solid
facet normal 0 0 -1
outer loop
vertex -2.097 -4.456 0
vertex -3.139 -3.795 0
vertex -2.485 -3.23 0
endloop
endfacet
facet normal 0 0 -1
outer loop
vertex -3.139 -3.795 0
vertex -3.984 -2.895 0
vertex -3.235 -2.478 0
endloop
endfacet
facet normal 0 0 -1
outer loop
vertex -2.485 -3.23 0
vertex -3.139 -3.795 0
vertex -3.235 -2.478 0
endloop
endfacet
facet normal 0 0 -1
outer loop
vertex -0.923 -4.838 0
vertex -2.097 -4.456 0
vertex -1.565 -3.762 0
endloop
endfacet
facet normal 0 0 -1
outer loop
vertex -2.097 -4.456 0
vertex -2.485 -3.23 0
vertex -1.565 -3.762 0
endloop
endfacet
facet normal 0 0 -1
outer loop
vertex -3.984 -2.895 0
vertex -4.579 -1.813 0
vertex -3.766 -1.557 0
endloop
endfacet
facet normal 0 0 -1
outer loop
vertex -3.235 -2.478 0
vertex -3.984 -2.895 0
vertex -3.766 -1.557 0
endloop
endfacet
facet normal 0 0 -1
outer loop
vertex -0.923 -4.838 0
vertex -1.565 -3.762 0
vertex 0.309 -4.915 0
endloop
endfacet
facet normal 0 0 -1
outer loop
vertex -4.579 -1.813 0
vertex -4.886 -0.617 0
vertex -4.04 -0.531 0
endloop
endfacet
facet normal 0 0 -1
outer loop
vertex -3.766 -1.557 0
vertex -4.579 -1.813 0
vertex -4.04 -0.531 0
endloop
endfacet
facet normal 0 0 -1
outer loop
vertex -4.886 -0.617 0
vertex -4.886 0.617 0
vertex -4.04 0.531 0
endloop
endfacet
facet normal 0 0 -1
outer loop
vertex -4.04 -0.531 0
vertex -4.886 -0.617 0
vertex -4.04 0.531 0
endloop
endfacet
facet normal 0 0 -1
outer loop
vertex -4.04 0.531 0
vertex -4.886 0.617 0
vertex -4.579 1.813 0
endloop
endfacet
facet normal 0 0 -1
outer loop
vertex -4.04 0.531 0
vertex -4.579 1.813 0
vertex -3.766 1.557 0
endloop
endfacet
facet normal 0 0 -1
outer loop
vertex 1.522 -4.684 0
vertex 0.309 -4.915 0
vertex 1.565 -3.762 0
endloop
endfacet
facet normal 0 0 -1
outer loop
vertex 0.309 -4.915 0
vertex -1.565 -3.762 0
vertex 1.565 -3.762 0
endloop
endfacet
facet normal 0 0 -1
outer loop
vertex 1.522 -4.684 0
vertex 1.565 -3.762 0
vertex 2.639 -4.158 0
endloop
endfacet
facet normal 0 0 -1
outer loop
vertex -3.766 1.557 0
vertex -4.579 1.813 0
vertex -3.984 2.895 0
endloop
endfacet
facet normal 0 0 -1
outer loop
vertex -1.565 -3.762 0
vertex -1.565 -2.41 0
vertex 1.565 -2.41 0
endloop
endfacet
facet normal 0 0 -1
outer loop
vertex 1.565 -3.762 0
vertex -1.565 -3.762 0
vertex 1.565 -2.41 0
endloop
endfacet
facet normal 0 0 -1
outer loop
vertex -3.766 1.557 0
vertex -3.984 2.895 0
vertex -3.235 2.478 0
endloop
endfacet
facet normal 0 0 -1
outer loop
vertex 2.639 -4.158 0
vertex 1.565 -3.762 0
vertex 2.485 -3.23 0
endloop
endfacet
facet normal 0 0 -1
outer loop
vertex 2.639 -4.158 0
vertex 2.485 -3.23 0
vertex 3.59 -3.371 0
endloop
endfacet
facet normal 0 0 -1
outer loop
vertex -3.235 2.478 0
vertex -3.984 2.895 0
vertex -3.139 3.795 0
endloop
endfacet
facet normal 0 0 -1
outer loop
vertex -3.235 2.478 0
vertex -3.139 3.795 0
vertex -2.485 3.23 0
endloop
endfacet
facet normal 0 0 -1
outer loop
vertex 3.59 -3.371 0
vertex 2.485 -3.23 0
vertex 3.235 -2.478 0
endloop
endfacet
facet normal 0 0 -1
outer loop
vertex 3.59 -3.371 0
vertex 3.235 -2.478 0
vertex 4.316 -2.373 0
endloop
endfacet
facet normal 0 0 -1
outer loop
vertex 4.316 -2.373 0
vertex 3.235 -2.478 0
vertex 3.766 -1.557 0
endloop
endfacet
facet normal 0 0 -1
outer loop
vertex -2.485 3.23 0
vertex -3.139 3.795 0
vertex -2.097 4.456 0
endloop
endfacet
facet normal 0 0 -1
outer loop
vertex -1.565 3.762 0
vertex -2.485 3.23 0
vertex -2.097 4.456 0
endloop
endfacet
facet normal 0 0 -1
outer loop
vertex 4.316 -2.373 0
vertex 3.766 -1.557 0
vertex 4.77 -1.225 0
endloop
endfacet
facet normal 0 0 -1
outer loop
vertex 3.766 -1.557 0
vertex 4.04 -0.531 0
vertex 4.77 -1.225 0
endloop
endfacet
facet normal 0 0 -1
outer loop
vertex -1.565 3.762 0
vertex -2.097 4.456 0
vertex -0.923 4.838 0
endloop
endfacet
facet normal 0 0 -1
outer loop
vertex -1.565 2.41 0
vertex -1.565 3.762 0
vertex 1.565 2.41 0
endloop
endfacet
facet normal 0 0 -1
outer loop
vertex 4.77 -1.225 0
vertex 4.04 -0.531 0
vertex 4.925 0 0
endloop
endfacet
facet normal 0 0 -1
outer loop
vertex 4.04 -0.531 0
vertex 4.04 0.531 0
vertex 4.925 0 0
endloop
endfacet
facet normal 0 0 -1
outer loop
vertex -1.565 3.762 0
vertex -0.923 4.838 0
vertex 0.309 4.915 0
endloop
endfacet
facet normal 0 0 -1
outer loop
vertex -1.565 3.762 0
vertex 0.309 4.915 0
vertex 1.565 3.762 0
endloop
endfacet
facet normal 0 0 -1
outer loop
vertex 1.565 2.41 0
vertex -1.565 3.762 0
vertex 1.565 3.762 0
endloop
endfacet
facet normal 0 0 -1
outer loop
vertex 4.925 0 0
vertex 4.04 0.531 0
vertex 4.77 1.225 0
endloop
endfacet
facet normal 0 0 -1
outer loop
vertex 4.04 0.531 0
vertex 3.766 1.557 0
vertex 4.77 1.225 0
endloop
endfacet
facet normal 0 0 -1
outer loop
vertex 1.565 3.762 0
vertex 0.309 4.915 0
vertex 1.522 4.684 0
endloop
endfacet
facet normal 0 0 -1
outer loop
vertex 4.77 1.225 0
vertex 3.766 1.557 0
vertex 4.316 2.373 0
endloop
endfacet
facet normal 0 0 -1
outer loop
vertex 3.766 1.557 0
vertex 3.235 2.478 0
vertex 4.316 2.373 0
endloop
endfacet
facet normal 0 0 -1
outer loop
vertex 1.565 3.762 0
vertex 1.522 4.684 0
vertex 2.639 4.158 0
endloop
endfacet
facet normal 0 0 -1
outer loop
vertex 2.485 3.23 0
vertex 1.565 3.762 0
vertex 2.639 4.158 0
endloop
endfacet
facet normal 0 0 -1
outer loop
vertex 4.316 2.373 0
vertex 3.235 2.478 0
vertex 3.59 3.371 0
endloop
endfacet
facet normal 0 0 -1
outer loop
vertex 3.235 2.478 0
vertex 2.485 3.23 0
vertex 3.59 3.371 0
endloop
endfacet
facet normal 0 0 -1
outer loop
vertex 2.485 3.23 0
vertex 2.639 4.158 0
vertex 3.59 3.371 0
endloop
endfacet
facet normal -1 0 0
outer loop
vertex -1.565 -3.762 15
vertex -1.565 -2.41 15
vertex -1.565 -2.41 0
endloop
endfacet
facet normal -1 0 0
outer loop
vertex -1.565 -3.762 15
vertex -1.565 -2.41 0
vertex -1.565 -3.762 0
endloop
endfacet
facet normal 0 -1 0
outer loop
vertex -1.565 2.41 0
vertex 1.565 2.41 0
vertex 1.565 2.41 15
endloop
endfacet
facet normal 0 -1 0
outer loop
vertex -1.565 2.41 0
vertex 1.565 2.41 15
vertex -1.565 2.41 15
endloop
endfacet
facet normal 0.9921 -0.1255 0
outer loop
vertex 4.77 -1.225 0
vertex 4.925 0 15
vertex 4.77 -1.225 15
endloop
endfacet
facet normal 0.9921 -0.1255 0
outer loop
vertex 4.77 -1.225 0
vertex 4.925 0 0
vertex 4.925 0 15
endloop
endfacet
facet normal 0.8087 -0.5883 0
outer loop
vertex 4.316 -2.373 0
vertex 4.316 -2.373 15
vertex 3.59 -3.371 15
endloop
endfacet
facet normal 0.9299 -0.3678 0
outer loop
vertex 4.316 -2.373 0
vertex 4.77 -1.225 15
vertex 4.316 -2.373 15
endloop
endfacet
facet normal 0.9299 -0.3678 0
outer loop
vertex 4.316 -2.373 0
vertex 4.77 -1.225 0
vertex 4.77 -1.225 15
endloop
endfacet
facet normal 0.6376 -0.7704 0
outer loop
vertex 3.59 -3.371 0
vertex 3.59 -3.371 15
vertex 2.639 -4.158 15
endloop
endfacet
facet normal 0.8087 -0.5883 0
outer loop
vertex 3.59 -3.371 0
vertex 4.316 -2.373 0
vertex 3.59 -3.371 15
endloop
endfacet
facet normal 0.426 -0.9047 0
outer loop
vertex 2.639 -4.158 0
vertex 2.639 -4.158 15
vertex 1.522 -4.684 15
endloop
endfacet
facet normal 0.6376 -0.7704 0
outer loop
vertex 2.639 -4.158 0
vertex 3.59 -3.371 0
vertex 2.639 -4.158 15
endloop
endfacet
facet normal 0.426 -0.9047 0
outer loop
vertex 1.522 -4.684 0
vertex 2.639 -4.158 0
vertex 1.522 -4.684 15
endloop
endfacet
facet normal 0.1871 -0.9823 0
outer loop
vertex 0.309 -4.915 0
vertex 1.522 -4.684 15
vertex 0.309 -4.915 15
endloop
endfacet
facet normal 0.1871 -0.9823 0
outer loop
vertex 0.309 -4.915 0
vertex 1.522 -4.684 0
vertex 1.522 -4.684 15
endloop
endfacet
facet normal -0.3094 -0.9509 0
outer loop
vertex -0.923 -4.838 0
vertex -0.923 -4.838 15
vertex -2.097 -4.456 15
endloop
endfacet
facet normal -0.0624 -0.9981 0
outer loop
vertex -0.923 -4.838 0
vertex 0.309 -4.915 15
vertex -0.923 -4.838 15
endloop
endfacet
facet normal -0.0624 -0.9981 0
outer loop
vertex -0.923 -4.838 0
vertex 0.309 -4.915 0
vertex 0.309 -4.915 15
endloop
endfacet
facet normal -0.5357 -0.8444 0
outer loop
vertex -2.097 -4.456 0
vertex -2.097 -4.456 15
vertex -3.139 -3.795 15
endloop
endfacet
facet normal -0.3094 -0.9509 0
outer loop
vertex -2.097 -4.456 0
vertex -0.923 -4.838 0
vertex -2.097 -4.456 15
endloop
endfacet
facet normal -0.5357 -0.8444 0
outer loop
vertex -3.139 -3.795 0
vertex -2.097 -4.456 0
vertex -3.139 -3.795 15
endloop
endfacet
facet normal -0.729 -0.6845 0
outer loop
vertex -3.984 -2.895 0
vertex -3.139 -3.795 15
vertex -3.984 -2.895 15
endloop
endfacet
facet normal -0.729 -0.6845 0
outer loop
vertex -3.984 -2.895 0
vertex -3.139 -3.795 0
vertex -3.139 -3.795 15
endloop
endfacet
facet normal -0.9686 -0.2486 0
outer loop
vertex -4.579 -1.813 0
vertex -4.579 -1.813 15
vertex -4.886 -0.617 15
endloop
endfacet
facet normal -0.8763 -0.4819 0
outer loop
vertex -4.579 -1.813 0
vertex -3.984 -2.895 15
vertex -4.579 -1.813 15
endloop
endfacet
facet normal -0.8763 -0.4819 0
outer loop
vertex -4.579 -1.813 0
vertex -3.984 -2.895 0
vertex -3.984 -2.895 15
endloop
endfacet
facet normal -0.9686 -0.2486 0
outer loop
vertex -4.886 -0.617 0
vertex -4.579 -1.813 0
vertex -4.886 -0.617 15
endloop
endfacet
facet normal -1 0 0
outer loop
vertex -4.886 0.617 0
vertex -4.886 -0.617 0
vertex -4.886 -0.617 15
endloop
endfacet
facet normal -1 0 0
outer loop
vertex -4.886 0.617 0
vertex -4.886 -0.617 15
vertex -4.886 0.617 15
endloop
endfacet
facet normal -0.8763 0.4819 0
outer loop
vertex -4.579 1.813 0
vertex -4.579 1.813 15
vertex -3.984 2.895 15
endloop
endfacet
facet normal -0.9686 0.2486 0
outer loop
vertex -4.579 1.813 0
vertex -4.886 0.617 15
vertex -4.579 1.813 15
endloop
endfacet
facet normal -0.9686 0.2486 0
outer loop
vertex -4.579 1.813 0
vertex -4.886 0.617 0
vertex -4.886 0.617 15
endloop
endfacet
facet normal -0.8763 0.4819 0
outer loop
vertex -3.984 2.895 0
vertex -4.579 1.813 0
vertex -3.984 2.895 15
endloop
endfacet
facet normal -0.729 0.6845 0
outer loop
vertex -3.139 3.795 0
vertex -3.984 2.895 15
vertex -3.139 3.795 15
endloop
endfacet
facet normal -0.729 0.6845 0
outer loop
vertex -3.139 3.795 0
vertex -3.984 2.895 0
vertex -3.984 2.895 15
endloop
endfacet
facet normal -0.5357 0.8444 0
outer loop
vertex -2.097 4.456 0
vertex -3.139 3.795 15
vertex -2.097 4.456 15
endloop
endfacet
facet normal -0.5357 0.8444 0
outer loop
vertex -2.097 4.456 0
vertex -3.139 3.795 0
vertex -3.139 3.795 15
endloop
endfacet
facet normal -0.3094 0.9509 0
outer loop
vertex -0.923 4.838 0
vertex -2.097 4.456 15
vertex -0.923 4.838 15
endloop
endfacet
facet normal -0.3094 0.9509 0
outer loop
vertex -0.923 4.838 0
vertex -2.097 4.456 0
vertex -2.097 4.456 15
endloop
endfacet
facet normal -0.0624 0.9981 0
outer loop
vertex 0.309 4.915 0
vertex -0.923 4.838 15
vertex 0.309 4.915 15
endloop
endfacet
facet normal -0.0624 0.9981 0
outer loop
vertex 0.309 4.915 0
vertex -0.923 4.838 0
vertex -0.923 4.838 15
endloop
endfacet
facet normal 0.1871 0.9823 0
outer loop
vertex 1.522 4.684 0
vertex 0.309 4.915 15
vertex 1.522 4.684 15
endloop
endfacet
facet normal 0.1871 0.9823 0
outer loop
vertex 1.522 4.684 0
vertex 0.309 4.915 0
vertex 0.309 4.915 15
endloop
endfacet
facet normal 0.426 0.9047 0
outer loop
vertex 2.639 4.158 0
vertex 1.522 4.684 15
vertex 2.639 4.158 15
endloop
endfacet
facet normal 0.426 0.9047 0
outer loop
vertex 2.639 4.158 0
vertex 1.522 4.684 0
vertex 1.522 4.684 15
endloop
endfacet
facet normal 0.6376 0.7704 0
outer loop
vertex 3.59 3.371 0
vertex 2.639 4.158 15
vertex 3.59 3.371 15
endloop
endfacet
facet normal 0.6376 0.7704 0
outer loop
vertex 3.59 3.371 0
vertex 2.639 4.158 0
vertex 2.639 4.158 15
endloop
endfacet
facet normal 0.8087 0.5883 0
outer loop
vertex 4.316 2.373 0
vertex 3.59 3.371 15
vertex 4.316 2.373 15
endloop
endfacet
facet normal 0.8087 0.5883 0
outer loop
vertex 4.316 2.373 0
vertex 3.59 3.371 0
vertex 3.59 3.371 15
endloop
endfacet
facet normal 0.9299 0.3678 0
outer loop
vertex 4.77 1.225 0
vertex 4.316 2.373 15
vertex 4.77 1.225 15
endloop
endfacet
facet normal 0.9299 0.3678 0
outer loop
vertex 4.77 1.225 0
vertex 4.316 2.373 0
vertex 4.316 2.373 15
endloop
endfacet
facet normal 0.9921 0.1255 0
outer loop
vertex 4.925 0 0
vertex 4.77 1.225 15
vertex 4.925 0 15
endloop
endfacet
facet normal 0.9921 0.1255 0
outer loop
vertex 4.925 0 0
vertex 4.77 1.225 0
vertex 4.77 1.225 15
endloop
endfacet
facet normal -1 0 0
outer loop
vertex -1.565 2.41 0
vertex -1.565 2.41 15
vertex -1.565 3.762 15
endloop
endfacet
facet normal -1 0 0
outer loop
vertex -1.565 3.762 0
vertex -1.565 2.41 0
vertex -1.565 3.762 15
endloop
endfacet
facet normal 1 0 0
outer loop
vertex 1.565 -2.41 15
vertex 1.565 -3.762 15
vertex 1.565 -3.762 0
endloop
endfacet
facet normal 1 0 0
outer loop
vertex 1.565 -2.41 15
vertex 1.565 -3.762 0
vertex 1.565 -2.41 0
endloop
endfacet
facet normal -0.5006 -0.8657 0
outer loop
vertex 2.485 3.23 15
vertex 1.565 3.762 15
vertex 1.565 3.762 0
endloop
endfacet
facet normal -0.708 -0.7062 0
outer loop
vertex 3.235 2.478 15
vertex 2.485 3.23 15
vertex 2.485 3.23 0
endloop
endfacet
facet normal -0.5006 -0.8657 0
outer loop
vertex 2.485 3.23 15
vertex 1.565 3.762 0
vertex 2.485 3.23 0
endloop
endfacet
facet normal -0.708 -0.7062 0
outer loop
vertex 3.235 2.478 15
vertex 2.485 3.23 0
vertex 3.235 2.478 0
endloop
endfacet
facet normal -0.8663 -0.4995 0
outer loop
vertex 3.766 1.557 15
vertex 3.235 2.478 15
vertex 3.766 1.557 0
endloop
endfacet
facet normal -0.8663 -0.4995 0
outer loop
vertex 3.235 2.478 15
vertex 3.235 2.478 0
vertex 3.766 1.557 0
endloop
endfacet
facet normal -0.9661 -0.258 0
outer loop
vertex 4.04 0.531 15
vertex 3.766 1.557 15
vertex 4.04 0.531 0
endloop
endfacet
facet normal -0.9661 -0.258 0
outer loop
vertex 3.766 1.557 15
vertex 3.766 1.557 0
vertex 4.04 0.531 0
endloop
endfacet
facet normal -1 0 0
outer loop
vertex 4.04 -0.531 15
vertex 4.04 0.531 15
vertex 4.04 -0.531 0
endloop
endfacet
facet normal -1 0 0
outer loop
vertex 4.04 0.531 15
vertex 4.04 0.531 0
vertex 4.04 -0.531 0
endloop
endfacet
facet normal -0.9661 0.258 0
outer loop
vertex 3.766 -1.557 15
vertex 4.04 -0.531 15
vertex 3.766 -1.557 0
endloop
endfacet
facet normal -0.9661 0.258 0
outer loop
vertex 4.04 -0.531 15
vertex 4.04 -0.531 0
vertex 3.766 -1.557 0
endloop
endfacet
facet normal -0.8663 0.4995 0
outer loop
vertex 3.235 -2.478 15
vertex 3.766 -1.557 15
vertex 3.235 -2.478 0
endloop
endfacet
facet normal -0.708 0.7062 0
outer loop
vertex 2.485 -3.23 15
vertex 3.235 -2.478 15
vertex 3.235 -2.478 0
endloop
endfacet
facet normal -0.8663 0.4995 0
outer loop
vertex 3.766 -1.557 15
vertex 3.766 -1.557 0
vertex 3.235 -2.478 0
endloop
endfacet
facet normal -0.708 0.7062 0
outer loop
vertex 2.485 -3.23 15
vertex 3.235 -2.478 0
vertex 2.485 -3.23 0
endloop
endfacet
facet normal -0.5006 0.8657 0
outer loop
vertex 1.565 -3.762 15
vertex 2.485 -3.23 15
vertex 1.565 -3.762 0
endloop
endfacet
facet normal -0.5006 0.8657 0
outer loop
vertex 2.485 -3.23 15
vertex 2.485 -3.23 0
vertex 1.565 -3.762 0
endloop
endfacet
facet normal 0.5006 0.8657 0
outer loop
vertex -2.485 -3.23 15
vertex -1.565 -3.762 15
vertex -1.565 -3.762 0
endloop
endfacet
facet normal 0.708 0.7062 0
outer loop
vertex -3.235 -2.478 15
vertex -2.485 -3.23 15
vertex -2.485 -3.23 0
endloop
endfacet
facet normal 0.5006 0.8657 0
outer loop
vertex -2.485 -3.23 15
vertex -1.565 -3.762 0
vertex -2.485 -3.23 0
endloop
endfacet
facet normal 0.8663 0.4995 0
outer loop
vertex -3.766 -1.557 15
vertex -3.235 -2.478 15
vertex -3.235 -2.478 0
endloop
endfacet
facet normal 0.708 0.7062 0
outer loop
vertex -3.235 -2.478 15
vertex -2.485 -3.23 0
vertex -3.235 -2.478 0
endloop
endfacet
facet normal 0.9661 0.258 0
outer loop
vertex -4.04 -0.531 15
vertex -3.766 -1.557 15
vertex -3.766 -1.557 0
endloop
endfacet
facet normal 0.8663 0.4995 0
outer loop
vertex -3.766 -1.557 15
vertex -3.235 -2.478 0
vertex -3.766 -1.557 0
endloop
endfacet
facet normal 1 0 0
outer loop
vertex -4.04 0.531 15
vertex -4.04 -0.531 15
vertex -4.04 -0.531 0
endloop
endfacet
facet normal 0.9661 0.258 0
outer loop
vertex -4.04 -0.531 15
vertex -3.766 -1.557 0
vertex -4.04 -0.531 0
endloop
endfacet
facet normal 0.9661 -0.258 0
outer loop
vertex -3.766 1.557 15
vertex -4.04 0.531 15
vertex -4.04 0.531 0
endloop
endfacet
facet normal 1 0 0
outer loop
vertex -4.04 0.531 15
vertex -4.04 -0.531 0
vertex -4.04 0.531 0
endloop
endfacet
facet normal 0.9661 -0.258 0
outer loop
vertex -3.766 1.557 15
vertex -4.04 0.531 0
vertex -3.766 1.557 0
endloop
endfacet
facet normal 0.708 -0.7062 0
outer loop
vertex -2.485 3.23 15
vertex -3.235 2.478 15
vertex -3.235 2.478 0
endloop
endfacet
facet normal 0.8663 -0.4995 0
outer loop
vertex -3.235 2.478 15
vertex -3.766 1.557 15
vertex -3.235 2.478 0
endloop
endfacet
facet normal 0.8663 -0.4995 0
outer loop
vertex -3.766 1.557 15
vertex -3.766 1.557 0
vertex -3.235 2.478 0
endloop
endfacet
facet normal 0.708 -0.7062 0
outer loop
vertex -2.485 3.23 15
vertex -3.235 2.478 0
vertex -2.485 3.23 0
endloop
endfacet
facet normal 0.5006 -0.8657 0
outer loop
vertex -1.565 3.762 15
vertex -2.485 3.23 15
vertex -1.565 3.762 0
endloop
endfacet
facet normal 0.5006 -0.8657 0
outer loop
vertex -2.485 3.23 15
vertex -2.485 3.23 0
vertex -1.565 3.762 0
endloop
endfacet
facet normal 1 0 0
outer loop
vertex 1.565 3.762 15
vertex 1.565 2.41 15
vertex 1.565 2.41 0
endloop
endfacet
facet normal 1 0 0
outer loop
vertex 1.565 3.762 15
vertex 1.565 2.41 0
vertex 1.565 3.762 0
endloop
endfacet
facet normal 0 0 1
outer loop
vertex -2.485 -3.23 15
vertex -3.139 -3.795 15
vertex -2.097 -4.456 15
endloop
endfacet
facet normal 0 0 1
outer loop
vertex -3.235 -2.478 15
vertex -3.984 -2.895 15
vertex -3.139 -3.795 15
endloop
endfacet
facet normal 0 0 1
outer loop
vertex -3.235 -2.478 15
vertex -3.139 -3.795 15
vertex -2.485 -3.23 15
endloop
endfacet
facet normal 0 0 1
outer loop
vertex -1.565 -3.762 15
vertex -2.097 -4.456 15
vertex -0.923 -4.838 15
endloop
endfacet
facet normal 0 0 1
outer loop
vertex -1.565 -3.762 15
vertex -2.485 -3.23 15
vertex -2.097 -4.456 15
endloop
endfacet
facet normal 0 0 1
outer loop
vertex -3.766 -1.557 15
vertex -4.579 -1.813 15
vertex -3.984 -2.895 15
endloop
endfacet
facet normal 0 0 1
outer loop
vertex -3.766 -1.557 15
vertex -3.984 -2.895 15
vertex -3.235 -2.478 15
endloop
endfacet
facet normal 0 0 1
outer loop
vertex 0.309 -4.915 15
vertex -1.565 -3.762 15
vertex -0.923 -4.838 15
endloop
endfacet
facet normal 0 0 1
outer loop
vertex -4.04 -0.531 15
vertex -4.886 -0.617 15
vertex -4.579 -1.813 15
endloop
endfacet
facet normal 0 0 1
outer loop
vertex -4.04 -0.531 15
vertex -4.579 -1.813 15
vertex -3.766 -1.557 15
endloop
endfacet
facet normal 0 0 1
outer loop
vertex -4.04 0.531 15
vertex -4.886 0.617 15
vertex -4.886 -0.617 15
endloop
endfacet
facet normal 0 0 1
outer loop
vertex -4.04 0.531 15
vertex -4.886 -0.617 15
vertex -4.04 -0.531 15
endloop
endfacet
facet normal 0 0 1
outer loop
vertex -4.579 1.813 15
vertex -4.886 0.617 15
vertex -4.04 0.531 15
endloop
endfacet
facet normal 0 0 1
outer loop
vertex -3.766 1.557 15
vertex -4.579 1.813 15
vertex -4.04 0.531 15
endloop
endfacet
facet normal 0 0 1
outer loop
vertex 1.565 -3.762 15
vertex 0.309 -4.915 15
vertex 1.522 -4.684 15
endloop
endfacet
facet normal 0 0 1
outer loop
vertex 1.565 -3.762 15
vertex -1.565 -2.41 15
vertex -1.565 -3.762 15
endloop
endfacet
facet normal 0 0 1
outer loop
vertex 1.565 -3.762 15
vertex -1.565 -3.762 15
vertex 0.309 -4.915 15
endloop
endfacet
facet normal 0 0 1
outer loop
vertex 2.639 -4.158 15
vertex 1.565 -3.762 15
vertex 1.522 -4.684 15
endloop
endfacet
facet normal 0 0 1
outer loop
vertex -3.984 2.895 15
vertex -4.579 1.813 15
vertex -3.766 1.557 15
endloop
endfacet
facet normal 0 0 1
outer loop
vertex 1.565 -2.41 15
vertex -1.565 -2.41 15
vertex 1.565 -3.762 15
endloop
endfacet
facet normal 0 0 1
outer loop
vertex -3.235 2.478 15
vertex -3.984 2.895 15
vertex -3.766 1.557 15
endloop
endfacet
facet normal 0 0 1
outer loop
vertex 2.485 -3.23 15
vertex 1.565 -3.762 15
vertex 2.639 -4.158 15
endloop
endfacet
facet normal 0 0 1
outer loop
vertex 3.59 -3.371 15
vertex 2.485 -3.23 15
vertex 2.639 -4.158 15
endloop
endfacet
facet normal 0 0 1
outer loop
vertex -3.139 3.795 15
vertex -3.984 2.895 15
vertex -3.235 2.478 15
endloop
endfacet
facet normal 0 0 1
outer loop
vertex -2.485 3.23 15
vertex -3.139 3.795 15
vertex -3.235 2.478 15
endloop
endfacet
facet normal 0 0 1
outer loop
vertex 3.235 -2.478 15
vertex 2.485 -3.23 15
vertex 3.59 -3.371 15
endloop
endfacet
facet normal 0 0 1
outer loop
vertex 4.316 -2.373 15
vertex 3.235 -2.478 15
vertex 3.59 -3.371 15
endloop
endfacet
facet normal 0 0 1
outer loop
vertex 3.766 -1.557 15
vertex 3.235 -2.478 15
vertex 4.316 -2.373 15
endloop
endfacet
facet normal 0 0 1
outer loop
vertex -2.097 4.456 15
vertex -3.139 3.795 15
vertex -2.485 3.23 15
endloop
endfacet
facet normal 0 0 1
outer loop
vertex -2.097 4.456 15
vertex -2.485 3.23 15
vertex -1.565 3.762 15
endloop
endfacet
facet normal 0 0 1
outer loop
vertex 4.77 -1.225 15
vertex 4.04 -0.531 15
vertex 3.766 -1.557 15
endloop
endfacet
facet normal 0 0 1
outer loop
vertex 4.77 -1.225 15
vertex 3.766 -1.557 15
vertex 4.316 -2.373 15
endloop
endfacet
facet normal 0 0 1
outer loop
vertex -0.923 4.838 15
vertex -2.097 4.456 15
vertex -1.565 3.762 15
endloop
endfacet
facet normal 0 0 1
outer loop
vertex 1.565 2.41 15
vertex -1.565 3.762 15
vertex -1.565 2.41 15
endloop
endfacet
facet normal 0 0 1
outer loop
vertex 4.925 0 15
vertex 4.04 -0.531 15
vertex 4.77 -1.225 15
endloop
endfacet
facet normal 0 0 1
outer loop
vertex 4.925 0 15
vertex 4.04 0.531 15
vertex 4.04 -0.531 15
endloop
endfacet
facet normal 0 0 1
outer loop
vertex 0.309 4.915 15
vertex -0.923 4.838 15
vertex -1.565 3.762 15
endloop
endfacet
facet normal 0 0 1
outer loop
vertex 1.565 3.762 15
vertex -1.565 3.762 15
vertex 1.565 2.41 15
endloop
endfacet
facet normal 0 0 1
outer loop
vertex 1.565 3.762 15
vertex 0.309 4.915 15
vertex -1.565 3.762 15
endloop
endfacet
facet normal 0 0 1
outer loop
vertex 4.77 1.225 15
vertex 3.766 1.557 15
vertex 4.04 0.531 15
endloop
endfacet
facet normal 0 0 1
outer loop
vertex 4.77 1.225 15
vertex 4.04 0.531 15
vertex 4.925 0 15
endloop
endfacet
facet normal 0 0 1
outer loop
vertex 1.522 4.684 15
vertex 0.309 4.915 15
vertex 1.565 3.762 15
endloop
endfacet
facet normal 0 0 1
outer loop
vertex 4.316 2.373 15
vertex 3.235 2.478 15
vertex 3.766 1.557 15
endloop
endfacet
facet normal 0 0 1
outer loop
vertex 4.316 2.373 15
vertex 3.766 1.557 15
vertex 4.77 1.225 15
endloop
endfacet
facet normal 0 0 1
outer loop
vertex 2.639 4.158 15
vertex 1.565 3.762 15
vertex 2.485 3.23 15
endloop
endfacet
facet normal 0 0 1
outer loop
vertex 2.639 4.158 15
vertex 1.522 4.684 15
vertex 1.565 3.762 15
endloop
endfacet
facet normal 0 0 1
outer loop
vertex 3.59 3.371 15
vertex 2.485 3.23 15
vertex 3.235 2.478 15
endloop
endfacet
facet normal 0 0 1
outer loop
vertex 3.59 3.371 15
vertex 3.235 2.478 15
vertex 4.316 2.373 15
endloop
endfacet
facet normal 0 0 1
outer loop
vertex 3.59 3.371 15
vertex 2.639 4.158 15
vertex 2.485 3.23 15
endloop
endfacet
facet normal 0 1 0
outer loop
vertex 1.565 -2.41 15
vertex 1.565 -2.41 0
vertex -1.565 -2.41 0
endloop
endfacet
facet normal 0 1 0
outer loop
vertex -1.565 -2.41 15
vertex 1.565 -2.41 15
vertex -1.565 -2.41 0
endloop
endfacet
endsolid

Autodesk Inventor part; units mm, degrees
ref_plane "YZ Plane" through (0, 0, 0) normal (1, 0, 0) x (0, 1, 0)
ref_plane "XZ Plane" through (0, 0, 0) normal (0, 1, 0) x (-1, 0, 0)
ref_plane "XY Plane" through (0, 0, 0) normal (0, 0, 1) x (1, 0, 0)
sketch "Sketch1" plane through (0, 0, 0) normal (0, 0, 1) x (1, 0, 0)
  line L0 (-3.9756, 0) -> (3.9756, 0)
  arc A0 (3.9756, 0) -> (1.5654, 3.6545) centre (0, 0) ccw
  line L1 (1.5654, 3.6545) -> (1.5654, 2.4102)
  line L2 (1.5654, 2.4102) -> (-1.5654, 2.4102)
  line L3 (-1.5654, 2.4102) -> (-1.5654, 3.6545)
  arc A1 (-1.5654, 3.6545) -> (-3.9756, 0) centre (0, 0) ccw
  circle A2 centre (0, 0) radius 4.075
  circle A3 centre (0, 0) radius 4.925
  line L4 (-1.5654, 3.6545) -> (-1.5654, 3.7623)
  line L5 (1.5654, 3.6545) -> (1.5654, 3.7623)
  line L6 (-4.075, 0) -> (4.2123, 0)
  line L7 (1.5654, -3.6545) -> (1.5654, -2.4102)
  line L8 (1.5654, -2.4102) -> (-1.5654, -2.4102)
  line L9 (-1.5654, -2.4102) -> (-1.5654, -3.6545)
  line L10 (-1.5654, -3.6545) -> (-1.5654, -3.7623)
  line L11 (1.5654, -3.6545) -> (1.5654, -3.7623)
  point P0 (0, 0)
  dimension "d0" = 8.15
  dimension "d1" = 9.85
extrude "Extrusion1" add sketch "Sketch1" along normal blind 15 contours L4 A2 L5 L1 L2 L3 | L10 L9 L8 L7 L11 A2 | A3
properties part number "Axel_connector"
